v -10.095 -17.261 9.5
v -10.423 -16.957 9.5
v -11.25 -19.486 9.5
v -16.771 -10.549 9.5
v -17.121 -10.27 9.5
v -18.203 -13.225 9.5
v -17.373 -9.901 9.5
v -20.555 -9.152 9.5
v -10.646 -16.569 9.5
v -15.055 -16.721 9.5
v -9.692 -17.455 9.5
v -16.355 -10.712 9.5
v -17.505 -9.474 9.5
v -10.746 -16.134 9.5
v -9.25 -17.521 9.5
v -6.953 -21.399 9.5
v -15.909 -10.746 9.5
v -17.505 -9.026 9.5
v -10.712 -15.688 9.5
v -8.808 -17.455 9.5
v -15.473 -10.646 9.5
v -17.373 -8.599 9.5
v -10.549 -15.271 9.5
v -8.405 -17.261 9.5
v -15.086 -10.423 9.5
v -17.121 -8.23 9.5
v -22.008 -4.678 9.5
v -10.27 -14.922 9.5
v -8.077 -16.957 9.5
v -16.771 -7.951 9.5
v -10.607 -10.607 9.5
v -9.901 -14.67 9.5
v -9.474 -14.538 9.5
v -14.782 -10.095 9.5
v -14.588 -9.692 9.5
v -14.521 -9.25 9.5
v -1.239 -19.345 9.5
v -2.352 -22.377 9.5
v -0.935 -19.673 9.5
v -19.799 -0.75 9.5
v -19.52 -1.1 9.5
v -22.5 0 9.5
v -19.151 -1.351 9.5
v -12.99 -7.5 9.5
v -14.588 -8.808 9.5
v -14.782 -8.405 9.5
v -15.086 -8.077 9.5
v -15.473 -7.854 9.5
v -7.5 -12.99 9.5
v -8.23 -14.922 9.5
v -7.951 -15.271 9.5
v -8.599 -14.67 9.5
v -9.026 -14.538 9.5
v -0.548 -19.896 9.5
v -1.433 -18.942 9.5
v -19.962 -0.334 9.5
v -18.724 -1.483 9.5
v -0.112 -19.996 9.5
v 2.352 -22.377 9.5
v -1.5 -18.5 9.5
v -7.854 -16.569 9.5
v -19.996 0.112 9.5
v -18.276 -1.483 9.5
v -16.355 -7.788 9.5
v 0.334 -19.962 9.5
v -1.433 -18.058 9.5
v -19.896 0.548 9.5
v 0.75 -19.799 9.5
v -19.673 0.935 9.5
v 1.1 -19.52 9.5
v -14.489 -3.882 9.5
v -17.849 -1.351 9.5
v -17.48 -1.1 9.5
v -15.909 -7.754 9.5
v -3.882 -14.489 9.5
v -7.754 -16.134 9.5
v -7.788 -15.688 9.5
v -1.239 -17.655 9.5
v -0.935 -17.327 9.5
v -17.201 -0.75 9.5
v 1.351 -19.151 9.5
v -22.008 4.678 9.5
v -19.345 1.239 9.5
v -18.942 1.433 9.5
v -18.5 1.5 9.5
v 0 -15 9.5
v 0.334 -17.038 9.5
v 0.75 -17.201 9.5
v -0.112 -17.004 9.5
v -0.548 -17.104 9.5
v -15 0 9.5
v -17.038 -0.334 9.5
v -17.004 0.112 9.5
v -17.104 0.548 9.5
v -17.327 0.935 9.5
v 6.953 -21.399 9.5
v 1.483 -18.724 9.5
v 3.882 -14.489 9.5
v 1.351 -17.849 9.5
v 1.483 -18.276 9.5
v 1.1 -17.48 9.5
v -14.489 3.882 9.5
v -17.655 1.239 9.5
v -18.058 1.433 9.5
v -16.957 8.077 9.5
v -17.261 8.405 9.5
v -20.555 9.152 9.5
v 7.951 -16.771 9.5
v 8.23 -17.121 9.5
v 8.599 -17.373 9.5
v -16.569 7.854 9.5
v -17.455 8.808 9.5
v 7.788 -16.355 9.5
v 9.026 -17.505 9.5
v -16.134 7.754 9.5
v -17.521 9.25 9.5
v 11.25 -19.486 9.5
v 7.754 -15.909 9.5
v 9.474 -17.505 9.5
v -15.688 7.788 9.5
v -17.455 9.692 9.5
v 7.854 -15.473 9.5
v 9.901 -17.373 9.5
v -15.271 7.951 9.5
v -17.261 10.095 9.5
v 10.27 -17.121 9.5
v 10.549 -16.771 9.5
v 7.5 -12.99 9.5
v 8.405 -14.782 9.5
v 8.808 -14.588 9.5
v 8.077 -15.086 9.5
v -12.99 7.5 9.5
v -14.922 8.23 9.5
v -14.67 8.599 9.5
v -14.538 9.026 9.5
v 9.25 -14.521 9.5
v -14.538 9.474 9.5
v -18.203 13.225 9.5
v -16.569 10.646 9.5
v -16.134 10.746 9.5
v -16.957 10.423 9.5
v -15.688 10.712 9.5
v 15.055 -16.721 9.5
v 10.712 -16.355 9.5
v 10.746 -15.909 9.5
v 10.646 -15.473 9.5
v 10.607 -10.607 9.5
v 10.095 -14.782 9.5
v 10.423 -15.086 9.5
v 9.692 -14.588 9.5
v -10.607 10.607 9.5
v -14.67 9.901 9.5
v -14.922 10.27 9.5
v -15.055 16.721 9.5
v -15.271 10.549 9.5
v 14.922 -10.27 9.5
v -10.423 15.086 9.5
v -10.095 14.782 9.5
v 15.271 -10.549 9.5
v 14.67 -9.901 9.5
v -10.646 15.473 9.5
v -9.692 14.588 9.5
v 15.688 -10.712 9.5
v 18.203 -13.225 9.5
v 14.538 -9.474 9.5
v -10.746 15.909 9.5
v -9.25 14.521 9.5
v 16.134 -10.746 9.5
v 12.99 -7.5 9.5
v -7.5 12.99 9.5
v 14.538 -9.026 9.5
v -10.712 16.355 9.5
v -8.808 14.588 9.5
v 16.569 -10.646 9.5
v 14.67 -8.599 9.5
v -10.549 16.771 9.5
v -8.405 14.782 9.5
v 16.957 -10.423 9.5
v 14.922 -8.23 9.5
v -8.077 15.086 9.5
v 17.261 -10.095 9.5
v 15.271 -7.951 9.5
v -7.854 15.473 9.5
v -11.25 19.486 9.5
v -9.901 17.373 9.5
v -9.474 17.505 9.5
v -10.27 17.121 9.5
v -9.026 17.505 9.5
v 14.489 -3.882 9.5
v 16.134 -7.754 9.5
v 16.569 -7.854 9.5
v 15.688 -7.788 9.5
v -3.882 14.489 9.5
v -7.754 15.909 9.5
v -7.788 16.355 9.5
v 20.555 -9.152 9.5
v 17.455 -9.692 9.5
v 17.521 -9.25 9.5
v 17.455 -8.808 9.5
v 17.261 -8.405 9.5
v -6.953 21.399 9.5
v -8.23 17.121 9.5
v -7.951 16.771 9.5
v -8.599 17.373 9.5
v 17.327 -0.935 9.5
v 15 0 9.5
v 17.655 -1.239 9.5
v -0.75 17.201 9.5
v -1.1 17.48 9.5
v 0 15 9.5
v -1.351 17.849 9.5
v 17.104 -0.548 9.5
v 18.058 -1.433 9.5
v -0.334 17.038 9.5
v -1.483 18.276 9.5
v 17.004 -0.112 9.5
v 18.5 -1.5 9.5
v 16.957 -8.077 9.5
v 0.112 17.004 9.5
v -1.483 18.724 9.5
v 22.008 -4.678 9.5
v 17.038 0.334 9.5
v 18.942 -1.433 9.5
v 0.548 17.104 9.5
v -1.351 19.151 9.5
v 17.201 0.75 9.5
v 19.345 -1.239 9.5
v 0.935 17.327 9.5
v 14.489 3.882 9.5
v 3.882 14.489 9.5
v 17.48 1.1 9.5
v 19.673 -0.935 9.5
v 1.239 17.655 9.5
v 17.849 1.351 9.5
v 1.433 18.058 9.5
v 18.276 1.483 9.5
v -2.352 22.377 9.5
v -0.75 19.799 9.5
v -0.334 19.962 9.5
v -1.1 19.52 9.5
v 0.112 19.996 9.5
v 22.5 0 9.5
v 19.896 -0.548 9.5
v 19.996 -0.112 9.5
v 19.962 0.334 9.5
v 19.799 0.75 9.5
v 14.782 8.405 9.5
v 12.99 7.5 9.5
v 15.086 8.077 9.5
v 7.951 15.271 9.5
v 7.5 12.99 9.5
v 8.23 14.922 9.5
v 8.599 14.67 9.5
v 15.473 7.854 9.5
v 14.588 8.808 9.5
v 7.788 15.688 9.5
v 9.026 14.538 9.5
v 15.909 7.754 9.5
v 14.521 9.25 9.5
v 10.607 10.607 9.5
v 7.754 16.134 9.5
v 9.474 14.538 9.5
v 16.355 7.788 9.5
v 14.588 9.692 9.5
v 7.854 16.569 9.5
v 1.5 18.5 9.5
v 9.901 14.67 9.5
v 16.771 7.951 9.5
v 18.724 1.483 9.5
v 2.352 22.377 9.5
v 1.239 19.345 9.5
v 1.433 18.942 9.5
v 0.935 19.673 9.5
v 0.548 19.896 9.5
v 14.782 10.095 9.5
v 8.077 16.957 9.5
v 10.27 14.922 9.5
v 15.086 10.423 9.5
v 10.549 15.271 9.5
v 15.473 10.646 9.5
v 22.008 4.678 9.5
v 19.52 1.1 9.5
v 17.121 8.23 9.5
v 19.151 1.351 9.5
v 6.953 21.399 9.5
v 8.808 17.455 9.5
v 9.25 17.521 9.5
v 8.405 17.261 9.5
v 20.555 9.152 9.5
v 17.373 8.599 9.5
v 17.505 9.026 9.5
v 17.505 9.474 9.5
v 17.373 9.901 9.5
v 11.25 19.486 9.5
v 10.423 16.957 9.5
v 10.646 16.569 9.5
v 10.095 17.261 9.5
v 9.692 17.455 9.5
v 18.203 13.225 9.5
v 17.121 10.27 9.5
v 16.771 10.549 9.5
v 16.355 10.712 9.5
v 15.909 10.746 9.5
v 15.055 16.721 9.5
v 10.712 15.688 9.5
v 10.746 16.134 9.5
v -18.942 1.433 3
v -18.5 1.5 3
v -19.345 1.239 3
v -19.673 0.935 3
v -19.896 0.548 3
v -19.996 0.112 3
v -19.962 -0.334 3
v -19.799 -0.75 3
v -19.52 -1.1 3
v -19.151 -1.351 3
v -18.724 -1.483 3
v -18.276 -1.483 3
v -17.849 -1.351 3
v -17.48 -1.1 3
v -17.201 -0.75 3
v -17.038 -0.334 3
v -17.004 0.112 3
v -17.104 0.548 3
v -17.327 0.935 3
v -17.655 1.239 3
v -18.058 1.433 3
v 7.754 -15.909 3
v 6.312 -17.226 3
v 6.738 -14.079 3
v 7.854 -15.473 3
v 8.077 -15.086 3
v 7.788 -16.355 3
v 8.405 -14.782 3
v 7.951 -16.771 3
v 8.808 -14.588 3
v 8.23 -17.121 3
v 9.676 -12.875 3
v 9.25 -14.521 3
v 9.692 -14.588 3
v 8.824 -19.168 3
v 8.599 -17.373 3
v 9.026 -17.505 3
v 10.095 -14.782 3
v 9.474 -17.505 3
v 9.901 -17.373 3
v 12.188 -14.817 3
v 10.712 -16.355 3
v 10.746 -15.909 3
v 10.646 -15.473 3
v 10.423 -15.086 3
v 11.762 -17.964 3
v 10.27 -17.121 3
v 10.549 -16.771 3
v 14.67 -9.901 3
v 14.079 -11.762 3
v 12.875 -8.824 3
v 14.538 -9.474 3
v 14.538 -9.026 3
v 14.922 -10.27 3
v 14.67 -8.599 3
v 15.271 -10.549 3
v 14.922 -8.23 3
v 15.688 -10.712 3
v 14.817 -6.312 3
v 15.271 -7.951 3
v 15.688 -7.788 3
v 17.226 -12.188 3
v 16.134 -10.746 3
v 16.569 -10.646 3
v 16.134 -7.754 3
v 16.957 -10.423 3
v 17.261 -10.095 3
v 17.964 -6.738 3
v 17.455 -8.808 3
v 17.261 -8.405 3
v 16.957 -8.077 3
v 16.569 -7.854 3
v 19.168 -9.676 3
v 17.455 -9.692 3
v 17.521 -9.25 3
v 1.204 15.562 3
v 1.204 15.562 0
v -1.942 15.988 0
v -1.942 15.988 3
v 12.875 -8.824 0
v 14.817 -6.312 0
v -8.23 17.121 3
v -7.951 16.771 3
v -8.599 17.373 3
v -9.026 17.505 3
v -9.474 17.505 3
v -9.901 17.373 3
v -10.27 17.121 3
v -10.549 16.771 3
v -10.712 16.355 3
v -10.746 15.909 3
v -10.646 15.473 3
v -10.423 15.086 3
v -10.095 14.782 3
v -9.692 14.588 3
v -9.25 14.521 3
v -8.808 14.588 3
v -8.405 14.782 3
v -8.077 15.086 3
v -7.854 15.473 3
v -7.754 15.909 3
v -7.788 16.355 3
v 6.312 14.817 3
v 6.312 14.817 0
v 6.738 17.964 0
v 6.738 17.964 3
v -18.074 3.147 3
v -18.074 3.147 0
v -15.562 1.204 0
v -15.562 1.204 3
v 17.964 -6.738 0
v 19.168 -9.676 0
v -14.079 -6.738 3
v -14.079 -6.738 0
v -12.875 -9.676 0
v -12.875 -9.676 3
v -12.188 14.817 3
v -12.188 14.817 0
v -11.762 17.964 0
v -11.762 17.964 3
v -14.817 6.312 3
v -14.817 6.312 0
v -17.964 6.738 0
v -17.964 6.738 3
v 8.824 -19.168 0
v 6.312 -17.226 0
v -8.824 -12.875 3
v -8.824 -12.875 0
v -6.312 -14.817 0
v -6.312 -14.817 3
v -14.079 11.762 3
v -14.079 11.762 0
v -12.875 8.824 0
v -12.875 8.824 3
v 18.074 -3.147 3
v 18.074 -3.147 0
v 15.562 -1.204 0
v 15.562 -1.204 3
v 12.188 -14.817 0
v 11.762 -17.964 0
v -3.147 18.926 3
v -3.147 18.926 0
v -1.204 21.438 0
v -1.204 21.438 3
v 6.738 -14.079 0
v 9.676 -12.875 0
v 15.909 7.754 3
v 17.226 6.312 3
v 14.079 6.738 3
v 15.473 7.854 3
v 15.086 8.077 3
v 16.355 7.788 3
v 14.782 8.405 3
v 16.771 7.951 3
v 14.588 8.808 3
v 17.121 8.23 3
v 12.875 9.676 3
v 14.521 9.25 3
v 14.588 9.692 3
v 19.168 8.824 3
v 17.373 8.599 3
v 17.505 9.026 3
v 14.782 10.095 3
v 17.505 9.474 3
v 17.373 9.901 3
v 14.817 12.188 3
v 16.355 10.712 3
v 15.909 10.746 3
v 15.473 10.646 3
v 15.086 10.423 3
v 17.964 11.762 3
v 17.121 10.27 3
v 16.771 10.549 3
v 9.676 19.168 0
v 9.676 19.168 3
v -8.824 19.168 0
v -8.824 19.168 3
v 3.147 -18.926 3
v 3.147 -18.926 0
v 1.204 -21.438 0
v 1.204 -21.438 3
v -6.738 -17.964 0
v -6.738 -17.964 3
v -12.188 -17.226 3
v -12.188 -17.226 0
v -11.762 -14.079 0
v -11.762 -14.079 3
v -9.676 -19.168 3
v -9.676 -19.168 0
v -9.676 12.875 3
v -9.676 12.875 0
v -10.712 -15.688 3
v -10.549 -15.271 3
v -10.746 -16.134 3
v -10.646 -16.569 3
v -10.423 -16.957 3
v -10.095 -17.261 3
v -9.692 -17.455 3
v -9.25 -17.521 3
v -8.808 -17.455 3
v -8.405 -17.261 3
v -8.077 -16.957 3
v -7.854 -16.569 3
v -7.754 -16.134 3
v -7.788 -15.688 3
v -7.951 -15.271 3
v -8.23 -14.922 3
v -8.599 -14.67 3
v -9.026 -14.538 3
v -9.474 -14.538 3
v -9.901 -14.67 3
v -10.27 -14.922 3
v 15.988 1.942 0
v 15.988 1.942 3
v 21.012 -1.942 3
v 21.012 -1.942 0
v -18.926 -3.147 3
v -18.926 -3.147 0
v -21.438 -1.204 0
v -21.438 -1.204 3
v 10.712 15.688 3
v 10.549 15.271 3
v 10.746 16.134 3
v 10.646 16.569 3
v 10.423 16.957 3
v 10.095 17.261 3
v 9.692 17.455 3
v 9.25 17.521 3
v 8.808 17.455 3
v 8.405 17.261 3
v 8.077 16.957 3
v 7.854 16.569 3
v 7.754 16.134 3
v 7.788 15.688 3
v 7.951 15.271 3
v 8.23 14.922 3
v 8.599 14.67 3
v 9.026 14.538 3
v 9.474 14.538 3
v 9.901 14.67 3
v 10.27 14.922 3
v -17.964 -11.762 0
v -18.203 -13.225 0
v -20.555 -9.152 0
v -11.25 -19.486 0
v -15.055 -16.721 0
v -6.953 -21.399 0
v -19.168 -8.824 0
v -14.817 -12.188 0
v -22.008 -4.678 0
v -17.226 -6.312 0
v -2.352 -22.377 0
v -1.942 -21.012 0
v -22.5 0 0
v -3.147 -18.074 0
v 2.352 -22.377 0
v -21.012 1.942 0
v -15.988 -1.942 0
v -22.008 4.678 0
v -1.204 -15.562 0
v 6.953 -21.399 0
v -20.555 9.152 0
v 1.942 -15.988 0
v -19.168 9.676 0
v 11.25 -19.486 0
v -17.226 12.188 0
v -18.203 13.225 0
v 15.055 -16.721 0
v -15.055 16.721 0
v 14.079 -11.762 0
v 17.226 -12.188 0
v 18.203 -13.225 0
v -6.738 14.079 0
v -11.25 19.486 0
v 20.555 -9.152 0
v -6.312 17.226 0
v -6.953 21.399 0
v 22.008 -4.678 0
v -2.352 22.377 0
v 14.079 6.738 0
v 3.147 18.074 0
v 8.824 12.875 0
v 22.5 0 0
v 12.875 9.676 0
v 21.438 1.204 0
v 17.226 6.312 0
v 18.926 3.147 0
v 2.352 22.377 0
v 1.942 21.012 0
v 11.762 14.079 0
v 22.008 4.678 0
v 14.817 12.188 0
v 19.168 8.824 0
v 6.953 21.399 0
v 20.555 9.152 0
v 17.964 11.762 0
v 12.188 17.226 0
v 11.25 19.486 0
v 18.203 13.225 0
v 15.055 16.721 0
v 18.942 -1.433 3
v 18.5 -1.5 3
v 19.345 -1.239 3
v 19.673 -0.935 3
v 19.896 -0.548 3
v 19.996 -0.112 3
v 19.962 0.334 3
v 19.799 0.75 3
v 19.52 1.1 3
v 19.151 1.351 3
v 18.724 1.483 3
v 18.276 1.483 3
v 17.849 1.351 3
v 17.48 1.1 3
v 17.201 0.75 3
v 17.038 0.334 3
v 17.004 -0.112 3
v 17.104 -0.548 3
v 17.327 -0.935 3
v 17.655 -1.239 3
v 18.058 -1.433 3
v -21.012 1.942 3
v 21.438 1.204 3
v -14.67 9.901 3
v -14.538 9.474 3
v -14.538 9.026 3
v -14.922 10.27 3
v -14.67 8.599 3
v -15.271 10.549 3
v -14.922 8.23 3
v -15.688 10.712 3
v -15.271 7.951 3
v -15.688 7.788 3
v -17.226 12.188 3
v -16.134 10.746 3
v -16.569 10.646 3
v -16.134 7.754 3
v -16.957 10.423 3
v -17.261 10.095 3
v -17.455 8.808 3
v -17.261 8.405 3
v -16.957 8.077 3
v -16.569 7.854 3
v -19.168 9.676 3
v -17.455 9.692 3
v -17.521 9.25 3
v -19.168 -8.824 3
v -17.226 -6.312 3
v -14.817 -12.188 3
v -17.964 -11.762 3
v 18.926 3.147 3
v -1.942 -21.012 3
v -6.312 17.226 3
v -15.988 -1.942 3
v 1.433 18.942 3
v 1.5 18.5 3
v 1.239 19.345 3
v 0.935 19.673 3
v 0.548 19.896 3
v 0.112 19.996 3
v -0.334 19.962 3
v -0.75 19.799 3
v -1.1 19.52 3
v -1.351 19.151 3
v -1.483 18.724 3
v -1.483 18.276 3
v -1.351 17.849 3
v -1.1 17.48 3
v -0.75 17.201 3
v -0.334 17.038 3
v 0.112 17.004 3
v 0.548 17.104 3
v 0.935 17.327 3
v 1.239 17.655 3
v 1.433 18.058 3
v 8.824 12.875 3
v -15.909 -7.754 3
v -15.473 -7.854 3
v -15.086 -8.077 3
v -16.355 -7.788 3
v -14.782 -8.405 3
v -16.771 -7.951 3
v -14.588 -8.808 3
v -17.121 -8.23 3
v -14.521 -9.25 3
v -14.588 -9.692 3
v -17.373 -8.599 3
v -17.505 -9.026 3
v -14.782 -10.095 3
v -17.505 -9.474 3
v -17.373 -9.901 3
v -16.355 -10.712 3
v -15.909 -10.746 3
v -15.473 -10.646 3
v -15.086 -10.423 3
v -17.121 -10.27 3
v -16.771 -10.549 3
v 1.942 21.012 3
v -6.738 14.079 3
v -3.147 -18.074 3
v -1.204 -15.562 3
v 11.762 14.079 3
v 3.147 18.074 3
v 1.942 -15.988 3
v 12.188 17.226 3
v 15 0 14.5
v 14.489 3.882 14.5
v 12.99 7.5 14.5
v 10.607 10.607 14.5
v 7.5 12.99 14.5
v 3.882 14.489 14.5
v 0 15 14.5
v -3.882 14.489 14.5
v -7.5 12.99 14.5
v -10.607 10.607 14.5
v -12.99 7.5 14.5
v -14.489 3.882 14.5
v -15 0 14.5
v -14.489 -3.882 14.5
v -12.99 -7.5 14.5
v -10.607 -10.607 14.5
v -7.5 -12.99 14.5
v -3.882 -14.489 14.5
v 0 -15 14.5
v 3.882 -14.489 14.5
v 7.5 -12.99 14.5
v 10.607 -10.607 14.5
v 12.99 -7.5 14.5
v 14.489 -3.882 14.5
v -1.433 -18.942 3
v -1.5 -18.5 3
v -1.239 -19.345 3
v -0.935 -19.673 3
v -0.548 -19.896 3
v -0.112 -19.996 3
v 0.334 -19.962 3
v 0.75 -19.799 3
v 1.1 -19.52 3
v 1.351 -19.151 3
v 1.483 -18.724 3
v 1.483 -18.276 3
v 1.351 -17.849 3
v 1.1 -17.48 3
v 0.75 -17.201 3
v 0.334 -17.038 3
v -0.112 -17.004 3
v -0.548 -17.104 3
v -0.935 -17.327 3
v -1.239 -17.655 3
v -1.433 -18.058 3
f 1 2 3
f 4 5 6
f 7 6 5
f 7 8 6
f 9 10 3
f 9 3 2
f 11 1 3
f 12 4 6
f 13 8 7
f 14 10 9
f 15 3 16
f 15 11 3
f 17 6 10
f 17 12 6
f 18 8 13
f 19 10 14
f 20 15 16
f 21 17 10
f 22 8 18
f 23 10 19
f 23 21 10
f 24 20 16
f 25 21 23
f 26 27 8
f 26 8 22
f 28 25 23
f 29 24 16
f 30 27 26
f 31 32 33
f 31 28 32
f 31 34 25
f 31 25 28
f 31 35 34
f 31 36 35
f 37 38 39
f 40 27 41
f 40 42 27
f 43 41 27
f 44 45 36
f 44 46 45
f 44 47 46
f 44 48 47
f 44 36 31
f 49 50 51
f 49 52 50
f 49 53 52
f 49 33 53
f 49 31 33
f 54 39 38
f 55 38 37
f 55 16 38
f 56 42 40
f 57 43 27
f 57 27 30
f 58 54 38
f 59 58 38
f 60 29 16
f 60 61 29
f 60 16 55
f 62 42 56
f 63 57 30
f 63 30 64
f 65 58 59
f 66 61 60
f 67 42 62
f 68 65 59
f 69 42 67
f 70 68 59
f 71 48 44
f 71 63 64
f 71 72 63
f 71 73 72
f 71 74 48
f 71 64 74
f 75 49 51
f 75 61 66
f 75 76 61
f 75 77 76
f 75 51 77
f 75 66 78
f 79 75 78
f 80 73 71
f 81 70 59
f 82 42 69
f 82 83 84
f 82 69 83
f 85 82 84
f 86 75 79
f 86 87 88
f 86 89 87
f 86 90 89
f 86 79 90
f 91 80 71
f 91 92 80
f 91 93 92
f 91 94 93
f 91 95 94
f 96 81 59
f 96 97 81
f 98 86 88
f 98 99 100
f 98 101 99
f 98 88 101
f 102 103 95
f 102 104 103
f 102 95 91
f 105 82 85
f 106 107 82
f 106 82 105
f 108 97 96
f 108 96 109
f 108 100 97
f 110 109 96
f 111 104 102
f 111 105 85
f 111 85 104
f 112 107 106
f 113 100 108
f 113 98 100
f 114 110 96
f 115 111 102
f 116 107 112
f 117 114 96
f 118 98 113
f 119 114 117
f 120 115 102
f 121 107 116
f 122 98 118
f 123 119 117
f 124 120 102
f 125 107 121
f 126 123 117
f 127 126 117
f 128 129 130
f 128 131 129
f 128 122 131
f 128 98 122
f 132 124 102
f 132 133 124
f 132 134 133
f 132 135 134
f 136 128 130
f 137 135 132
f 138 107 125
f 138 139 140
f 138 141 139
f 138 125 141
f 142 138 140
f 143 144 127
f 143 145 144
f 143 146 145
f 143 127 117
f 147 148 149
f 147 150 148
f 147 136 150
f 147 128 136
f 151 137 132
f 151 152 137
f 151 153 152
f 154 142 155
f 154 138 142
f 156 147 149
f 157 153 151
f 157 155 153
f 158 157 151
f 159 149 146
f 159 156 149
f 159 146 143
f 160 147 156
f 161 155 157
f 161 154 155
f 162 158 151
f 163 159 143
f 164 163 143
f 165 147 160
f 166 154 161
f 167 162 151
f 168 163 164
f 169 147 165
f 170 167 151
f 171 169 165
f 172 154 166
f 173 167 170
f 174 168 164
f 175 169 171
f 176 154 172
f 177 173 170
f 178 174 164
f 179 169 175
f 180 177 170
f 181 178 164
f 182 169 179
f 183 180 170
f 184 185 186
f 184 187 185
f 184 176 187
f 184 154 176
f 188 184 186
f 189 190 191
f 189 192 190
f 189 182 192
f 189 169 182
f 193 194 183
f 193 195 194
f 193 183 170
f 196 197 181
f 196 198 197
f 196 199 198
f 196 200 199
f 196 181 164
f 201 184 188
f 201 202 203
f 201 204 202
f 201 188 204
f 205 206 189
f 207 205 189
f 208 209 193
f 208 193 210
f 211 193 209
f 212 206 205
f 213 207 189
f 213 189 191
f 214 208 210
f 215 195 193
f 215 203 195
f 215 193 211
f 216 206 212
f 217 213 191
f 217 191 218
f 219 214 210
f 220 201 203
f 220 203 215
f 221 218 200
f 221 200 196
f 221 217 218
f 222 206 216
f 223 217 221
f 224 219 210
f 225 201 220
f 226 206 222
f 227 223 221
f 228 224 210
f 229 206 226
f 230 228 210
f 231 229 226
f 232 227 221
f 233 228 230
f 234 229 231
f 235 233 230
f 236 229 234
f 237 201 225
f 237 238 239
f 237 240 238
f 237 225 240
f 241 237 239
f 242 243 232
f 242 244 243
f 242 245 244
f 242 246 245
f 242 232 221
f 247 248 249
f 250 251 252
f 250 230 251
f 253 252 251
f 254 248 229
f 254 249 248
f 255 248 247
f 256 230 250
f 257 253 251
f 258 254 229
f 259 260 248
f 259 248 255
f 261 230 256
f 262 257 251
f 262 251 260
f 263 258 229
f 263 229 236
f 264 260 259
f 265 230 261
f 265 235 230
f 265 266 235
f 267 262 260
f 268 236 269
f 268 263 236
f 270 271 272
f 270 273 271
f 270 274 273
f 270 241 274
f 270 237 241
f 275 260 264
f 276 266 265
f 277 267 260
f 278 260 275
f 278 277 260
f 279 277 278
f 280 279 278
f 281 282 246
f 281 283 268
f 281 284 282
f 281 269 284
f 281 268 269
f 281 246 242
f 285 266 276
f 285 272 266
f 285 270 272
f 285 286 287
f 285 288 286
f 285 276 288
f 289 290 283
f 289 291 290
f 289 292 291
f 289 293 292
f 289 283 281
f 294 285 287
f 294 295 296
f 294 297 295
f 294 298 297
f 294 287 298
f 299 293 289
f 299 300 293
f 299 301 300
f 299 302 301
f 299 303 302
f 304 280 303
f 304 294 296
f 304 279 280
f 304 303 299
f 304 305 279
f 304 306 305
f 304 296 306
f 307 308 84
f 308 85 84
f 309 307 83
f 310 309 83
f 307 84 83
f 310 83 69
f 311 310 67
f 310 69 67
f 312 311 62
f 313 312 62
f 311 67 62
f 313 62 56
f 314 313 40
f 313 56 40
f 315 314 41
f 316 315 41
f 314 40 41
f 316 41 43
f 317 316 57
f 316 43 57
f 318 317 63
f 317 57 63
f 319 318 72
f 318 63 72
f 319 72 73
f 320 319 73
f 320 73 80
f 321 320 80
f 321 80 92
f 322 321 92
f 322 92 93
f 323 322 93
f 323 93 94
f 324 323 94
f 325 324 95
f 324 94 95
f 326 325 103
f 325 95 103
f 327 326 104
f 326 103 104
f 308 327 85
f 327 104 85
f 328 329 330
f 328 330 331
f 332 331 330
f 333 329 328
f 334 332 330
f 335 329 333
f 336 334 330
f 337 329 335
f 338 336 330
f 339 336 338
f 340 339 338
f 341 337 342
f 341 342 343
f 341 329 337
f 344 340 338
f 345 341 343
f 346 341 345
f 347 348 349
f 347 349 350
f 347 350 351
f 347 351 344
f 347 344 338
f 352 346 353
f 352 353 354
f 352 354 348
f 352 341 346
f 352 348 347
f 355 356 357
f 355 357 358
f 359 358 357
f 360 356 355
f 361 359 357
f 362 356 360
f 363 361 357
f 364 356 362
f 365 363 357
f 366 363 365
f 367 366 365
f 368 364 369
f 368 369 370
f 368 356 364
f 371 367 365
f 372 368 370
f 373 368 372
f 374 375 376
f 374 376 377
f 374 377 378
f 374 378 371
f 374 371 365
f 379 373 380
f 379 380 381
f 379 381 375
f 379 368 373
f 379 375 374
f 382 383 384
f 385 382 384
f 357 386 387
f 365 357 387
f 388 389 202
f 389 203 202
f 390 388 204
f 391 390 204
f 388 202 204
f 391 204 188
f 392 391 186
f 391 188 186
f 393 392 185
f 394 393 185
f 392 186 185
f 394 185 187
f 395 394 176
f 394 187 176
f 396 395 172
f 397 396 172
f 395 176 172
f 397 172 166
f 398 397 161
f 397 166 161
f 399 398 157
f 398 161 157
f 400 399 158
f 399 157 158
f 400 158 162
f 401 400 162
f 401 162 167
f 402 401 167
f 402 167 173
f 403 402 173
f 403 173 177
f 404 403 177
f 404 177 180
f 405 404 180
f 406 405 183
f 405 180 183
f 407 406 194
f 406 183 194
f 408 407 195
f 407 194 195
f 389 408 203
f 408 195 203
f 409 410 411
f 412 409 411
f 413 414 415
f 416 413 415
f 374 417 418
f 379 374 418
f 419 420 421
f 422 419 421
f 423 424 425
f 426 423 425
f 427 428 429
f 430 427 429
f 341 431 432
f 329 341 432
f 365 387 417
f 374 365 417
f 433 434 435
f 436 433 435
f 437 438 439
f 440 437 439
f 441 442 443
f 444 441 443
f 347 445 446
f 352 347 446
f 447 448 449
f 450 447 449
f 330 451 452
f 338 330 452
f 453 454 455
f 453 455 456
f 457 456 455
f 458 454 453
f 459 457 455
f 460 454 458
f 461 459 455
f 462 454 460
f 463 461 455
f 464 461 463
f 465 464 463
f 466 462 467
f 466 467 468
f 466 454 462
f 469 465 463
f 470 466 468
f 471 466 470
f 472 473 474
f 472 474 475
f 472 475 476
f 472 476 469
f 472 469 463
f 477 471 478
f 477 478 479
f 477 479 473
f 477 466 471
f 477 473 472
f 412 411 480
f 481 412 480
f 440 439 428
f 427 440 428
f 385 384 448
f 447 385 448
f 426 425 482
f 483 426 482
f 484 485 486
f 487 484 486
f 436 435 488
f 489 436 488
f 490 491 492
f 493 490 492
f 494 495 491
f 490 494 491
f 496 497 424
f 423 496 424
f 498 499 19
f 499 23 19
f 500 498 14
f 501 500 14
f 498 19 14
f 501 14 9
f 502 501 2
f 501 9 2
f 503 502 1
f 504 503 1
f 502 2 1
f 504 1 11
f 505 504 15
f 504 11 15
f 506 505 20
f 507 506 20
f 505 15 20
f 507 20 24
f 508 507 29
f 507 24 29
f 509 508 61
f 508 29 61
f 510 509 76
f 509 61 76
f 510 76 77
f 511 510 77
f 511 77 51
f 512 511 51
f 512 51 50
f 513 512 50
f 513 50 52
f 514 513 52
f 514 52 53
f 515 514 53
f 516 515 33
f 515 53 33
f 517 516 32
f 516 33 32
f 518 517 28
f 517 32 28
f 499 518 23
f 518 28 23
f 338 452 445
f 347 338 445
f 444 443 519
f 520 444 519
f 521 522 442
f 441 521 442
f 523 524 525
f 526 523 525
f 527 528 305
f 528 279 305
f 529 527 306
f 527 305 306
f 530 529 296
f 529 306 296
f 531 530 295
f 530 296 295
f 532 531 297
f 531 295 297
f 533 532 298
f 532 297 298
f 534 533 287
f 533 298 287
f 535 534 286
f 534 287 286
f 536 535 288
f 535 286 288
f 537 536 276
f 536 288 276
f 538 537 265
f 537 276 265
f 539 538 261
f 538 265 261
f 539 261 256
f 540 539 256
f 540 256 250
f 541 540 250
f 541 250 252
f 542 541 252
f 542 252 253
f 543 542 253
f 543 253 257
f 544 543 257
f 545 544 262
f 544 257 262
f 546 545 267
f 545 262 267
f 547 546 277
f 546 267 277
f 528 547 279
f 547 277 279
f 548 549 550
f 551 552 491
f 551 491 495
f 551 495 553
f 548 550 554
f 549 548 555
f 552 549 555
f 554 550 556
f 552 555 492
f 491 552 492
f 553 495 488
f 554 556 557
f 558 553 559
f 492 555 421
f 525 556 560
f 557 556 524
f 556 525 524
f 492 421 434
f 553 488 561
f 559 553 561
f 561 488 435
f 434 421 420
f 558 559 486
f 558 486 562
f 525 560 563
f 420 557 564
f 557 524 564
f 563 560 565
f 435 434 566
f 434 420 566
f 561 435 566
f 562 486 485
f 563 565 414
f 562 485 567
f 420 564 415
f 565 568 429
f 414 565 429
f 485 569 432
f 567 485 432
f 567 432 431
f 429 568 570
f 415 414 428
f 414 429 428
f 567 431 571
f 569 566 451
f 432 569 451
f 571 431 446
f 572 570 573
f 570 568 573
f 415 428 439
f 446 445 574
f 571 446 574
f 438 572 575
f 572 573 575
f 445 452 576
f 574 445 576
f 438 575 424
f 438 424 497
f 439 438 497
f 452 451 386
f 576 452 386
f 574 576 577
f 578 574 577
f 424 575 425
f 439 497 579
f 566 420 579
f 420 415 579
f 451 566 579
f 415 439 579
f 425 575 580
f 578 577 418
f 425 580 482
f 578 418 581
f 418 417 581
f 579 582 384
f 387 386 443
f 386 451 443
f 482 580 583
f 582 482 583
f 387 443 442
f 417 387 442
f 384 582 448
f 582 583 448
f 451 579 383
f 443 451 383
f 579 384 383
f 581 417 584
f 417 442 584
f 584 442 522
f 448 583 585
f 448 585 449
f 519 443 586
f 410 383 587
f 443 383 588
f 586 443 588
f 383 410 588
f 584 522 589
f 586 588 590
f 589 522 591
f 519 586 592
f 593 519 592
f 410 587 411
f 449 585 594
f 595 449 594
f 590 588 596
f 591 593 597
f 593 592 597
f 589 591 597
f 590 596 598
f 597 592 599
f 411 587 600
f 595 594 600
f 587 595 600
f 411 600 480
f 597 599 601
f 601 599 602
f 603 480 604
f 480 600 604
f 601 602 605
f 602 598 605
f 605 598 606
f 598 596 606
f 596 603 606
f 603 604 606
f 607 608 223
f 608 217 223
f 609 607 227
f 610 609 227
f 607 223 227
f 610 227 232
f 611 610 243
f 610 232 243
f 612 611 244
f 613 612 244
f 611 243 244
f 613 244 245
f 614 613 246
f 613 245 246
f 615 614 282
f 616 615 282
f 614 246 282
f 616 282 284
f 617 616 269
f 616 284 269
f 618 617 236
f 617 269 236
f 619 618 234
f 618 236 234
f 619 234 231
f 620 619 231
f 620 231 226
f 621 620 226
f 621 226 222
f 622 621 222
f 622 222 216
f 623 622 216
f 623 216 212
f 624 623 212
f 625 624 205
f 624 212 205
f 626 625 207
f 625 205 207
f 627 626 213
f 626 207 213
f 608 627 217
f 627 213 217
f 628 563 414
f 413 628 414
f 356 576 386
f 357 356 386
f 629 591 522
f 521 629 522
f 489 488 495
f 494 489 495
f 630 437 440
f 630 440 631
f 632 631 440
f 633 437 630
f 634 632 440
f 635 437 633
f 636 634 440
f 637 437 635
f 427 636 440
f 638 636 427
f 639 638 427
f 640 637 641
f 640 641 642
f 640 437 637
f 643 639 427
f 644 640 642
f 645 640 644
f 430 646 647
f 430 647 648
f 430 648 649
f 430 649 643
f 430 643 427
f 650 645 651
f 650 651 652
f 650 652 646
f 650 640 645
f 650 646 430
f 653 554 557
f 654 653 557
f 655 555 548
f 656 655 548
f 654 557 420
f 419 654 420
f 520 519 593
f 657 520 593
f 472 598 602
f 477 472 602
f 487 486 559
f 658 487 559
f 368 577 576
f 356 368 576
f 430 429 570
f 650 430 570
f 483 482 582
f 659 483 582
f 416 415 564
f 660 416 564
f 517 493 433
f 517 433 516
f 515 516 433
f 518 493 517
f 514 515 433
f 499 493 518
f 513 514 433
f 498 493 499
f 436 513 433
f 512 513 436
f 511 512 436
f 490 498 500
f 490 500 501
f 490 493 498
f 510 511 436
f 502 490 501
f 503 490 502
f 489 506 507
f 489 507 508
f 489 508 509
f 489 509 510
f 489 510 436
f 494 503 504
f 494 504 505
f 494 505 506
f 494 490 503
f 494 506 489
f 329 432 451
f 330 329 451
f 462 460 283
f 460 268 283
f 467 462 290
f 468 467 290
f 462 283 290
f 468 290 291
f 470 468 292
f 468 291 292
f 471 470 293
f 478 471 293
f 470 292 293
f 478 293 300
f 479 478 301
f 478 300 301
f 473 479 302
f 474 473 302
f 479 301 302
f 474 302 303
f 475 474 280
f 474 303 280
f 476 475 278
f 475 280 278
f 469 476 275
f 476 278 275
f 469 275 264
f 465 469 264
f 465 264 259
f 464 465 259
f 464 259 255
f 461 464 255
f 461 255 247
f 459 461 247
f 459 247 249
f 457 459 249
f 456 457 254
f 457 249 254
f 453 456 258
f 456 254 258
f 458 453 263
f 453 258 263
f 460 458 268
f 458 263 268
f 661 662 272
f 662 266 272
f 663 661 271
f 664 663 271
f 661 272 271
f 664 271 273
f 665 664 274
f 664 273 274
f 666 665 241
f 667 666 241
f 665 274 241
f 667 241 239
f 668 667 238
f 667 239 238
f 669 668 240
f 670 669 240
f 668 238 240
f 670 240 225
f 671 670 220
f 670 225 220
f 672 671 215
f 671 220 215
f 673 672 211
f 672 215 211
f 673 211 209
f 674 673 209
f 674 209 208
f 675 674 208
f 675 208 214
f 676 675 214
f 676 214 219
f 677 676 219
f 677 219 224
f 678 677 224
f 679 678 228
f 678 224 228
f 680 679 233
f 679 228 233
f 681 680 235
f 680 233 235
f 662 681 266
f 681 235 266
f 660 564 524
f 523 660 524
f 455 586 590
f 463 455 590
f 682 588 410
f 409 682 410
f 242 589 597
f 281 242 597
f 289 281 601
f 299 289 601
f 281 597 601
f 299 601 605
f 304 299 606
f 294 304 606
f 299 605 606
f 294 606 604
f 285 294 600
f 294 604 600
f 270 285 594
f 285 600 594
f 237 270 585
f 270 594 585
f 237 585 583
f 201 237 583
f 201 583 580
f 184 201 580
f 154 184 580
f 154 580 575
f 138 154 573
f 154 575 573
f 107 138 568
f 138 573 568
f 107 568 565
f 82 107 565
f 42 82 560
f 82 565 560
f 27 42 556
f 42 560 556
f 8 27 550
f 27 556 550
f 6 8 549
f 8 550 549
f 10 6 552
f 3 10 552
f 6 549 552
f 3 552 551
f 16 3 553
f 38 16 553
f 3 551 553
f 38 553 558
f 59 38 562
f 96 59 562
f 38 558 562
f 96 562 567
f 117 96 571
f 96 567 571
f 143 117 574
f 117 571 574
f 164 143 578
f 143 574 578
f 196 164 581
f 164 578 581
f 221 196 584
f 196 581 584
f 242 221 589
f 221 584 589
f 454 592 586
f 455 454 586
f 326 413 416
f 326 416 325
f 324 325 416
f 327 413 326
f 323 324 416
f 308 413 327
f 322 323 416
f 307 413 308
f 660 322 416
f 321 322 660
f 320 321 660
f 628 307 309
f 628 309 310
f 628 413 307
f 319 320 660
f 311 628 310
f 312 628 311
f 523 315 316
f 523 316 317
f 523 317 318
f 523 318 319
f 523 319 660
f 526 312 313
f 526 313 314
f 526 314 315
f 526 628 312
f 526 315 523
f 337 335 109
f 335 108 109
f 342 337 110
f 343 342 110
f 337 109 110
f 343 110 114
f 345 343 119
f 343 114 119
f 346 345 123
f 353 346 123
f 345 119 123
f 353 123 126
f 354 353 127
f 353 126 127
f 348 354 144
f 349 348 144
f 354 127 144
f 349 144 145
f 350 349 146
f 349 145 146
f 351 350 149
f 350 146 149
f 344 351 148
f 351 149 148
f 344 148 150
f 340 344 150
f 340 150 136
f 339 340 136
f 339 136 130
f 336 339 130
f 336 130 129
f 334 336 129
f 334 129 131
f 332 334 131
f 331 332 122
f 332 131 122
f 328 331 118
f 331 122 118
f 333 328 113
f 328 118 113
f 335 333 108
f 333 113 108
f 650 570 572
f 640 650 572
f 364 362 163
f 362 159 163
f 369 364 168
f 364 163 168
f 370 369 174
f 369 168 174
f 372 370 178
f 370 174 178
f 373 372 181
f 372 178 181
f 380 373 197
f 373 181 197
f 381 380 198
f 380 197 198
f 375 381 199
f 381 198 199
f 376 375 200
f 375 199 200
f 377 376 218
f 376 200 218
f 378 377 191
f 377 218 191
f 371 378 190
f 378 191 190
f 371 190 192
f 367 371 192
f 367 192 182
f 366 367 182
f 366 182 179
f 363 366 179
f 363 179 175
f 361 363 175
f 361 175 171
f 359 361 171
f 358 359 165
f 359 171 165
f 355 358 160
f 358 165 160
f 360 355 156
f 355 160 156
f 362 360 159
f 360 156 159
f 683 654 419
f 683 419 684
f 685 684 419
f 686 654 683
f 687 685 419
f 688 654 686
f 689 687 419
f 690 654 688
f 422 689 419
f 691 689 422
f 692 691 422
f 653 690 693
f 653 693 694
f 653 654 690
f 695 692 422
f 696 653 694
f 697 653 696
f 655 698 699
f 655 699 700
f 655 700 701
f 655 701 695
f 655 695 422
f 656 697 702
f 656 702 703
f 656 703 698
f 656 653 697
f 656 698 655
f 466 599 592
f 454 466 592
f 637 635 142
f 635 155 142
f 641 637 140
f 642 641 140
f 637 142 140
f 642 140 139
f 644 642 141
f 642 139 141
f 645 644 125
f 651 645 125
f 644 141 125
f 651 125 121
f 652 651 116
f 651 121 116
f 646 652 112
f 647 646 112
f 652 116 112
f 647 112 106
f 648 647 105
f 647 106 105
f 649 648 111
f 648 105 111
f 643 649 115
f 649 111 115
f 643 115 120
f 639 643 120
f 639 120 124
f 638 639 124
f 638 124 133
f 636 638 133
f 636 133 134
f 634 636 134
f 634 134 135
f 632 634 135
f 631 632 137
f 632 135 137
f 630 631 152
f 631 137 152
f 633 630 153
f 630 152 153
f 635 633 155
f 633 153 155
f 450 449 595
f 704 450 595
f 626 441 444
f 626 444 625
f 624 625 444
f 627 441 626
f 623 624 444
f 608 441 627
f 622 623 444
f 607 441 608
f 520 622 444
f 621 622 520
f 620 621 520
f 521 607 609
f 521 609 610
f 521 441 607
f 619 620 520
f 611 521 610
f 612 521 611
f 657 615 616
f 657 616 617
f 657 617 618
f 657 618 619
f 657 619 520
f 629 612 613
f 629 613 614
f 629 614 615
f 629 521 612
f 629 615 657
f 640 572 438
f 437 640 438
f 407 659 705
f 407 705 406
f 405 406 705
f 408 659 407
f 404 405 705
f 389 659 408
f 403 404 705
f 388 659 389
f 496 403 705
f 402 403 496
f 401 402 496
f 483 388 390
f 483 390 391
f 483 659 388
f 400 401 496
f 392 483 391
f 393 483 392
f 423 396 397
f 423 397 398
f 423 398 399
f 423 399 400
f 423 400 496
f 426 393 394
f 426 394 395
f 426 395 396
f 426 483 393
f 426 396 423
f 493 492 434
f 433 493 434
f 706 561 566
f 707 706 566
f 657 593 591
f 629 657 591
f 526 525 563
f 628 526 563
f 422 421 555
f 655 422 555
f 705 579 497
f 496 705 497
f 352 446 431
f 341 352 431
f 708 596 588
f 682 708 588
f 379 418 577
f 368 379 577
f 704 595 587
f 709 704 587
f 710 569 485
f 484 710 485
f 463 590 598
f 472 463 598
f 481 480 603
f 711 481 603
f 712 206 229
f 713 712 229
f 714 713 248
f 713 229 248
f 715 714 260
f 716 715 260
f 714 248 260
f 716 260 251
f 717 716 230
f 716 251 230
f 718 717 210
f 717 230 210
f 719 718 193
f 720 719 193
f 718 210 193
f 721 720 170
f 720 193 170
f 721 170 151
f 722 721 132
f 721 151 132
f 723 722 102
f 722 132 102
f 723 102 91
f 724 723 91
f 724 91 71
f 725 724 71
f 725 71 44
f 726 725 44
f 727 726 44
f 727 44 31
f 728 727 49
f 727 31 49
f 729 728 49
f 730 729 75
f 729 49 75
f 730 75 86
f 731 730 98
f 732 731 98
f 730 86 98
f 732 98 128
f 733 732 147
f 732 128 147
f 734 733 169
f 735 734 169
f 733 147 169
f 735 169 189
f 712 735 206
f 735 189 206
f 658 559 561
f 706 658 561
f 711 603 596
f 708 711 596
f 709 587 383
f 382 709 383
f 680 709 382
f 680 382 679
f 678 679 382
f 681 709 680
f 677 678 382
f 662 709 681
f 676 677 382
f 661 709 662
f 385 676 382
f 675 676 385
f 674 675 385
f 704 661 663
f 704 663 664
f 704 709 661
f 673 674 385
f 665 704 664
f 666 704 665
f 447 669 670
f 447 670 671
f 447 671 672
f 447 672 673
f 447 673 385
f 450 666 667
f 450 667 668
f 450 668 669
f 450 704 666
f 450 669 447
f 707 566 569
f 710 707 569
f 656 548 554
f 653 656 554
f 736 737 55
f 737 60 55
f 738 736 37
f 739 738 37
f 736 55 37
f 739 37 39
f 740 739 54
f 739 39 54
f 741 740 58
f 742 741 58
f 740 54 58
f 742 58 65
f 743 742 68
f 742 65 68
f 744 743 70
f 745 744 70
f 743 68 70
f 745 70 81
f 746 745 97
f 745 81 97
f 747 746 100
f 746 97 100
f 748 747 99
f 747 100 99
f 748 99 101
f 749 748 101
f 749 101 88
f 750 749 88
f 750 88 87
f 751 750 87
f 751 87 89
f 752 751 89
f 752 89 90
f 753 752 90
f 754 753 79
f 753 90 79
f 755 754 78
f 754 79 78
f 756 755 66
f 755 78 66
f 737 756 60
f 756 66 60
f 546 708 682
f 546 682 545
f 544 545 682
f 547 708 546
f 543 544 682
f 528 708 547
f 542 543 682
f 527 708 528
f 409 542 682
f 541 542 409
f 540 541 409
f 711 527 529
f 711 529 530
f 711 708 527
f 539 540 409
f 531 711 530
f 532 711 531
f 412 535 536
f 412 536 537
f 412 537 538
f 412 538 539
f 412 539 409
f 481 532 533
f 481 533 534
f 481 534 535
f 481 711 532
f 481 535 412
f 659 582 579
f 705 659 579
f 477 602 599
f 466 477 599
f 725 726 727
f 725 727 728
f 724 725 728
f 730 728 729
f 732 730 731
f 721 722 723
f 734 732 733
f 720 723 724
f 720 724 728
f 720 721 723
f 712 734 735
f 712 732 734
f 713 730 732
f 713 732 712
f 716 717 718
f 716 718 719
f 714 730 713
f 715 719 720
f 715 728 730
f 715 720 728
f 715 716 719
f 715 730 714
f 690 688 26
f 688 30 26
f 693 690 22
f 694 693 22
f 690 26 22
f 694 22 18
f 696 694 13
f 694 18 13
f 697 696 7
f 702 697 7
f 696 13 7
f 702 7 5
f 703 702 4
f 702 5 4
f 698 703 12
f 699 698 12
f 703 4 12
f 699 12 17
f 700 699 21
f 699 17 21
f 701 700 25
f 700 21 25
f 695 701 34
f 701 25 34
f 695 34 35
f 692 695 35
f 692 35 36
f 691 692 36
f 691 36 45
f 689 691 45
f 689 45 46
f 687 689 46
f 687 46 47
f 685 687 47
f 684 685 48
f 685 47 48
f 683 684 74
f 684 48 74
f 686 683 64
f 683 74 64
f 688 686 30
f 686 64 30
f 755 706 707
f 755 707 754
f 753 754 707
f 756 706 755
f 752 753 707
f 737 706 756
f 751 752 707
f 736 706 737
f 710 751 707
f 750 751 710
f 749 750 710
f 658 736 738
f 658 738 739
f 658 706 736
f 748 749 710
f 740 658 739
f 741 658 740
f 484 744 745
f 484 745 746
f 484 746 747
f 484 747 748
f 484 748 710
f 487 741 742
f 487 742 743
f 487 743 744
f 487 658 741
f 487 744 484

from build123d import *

# Parameters (mm, degrees)
SKETCH_1_R               = 22.5
EXTRUDE_1_DEPTH          = 9.5
SKETCH_2_R               = 15
EXTRUDE_2_DEPTH          = 5
SKETCH_3_R               = 1.5
CUT_EXTRUDE_1_DEPTH      = 5
SKETCH_5_R               = 1.5
CUT_EXTRUDE_2_DEPTH      = 34.207679835
CUT_EXTRUDE_6_DEPTH      = 3
PATTERN_CIRCULAR_1_COUNT = 12


with BuildPart() as part:
    # 草图1 → 凸台-拉伸1 (new body)
    with BuildSketch(Plane.XY):
        Circle(SKETCH_1_R)
    extrude(amount=EXTRUDE_1_DEPTH)

    # 草图2 → 凸台-拉伸2 (add)
    with BuildSketch(Plane.XY.offset(9.5)):
        Circle(SKETCH_2_R)
    extrude(amount=EXTRUDE_2_DEPTH)

    # 草图3 → 切除-拉伸1 (cut)
    with BuildSketch(Plane.XY.offset(9.5)):
        with Locations((0, 18.5)):
            Circle(SKETCH_3_R)
    cut_extrude_1 = extrude(amount=-CUT_EXTRUDE_1_DEPTH, mode=Mode.SUBTRACT)

    # 草图5 → 切除-拉伸2 (cut, through all)
    with BuildSketch(Plane.XY.offset(9.5)):
        with Locations((0, 18.5)):
            Circle(SKETCH_5_R)
    cut_extrude_2 = extrude(amount=-CUT_EXTRUDE_2_DEPTH, mode=Mode.SUBTRACT)

    # 草图9 → 切除-拉伸6 (cut)
    with BuildSketch(Plane(origin=(0, 0, 0), x_dir=(-1, 0, 0), z_dir=(0, 0, -1))):
        Polygon((1.204492644, 21.438116881), (-1.942237536, 21.012179669), (-3.14673018, 18.074062788), (-1.204492644, 15.561883119), (1.942237536, 15.987820331), (3.14673018, 18.925937212), align=None)
    cut_extrude_6 = extrude(amount=-CUT_EXTRUDE_6_DEPTH, mode=Mode.SUBTRACT)

    # 阵列(圆周)1: 切除-拉伸1, 切除-拉伸2, 切除-拉伸6 ×12 about axis
    pattern_circular_1_axis = Axis((0, 0, 0), (0, 0, 1))
    add([cut_extrude_1.rotate(pattern_circular_1_axis, i * 360 / PATTERN_CIRCULAR_1_COUNT) for i in range(1, PATTERN_CIRCULAR_1_COUNT)], mode=Mode.SUBTRACT)
    add([cut_extrude_2.rotate(pattern_circular_1_axis, i * 360 / PATTERN_CIRCULAR_1_COUNT) for i in range(1, PATTERN_CIRCULAR_1_COUNT)], mode=Mode.SUBTRACT)
    add([cut_extrude_6.rotate(pattern_circular_1_axis, i * 360 / PATTERN_CIRCULAR_1_COUNT) for i in range(1, PATTERN_CIRCULAR_1_COUNT)], mode=Mode.SUBTRACT)


solid = part.part
